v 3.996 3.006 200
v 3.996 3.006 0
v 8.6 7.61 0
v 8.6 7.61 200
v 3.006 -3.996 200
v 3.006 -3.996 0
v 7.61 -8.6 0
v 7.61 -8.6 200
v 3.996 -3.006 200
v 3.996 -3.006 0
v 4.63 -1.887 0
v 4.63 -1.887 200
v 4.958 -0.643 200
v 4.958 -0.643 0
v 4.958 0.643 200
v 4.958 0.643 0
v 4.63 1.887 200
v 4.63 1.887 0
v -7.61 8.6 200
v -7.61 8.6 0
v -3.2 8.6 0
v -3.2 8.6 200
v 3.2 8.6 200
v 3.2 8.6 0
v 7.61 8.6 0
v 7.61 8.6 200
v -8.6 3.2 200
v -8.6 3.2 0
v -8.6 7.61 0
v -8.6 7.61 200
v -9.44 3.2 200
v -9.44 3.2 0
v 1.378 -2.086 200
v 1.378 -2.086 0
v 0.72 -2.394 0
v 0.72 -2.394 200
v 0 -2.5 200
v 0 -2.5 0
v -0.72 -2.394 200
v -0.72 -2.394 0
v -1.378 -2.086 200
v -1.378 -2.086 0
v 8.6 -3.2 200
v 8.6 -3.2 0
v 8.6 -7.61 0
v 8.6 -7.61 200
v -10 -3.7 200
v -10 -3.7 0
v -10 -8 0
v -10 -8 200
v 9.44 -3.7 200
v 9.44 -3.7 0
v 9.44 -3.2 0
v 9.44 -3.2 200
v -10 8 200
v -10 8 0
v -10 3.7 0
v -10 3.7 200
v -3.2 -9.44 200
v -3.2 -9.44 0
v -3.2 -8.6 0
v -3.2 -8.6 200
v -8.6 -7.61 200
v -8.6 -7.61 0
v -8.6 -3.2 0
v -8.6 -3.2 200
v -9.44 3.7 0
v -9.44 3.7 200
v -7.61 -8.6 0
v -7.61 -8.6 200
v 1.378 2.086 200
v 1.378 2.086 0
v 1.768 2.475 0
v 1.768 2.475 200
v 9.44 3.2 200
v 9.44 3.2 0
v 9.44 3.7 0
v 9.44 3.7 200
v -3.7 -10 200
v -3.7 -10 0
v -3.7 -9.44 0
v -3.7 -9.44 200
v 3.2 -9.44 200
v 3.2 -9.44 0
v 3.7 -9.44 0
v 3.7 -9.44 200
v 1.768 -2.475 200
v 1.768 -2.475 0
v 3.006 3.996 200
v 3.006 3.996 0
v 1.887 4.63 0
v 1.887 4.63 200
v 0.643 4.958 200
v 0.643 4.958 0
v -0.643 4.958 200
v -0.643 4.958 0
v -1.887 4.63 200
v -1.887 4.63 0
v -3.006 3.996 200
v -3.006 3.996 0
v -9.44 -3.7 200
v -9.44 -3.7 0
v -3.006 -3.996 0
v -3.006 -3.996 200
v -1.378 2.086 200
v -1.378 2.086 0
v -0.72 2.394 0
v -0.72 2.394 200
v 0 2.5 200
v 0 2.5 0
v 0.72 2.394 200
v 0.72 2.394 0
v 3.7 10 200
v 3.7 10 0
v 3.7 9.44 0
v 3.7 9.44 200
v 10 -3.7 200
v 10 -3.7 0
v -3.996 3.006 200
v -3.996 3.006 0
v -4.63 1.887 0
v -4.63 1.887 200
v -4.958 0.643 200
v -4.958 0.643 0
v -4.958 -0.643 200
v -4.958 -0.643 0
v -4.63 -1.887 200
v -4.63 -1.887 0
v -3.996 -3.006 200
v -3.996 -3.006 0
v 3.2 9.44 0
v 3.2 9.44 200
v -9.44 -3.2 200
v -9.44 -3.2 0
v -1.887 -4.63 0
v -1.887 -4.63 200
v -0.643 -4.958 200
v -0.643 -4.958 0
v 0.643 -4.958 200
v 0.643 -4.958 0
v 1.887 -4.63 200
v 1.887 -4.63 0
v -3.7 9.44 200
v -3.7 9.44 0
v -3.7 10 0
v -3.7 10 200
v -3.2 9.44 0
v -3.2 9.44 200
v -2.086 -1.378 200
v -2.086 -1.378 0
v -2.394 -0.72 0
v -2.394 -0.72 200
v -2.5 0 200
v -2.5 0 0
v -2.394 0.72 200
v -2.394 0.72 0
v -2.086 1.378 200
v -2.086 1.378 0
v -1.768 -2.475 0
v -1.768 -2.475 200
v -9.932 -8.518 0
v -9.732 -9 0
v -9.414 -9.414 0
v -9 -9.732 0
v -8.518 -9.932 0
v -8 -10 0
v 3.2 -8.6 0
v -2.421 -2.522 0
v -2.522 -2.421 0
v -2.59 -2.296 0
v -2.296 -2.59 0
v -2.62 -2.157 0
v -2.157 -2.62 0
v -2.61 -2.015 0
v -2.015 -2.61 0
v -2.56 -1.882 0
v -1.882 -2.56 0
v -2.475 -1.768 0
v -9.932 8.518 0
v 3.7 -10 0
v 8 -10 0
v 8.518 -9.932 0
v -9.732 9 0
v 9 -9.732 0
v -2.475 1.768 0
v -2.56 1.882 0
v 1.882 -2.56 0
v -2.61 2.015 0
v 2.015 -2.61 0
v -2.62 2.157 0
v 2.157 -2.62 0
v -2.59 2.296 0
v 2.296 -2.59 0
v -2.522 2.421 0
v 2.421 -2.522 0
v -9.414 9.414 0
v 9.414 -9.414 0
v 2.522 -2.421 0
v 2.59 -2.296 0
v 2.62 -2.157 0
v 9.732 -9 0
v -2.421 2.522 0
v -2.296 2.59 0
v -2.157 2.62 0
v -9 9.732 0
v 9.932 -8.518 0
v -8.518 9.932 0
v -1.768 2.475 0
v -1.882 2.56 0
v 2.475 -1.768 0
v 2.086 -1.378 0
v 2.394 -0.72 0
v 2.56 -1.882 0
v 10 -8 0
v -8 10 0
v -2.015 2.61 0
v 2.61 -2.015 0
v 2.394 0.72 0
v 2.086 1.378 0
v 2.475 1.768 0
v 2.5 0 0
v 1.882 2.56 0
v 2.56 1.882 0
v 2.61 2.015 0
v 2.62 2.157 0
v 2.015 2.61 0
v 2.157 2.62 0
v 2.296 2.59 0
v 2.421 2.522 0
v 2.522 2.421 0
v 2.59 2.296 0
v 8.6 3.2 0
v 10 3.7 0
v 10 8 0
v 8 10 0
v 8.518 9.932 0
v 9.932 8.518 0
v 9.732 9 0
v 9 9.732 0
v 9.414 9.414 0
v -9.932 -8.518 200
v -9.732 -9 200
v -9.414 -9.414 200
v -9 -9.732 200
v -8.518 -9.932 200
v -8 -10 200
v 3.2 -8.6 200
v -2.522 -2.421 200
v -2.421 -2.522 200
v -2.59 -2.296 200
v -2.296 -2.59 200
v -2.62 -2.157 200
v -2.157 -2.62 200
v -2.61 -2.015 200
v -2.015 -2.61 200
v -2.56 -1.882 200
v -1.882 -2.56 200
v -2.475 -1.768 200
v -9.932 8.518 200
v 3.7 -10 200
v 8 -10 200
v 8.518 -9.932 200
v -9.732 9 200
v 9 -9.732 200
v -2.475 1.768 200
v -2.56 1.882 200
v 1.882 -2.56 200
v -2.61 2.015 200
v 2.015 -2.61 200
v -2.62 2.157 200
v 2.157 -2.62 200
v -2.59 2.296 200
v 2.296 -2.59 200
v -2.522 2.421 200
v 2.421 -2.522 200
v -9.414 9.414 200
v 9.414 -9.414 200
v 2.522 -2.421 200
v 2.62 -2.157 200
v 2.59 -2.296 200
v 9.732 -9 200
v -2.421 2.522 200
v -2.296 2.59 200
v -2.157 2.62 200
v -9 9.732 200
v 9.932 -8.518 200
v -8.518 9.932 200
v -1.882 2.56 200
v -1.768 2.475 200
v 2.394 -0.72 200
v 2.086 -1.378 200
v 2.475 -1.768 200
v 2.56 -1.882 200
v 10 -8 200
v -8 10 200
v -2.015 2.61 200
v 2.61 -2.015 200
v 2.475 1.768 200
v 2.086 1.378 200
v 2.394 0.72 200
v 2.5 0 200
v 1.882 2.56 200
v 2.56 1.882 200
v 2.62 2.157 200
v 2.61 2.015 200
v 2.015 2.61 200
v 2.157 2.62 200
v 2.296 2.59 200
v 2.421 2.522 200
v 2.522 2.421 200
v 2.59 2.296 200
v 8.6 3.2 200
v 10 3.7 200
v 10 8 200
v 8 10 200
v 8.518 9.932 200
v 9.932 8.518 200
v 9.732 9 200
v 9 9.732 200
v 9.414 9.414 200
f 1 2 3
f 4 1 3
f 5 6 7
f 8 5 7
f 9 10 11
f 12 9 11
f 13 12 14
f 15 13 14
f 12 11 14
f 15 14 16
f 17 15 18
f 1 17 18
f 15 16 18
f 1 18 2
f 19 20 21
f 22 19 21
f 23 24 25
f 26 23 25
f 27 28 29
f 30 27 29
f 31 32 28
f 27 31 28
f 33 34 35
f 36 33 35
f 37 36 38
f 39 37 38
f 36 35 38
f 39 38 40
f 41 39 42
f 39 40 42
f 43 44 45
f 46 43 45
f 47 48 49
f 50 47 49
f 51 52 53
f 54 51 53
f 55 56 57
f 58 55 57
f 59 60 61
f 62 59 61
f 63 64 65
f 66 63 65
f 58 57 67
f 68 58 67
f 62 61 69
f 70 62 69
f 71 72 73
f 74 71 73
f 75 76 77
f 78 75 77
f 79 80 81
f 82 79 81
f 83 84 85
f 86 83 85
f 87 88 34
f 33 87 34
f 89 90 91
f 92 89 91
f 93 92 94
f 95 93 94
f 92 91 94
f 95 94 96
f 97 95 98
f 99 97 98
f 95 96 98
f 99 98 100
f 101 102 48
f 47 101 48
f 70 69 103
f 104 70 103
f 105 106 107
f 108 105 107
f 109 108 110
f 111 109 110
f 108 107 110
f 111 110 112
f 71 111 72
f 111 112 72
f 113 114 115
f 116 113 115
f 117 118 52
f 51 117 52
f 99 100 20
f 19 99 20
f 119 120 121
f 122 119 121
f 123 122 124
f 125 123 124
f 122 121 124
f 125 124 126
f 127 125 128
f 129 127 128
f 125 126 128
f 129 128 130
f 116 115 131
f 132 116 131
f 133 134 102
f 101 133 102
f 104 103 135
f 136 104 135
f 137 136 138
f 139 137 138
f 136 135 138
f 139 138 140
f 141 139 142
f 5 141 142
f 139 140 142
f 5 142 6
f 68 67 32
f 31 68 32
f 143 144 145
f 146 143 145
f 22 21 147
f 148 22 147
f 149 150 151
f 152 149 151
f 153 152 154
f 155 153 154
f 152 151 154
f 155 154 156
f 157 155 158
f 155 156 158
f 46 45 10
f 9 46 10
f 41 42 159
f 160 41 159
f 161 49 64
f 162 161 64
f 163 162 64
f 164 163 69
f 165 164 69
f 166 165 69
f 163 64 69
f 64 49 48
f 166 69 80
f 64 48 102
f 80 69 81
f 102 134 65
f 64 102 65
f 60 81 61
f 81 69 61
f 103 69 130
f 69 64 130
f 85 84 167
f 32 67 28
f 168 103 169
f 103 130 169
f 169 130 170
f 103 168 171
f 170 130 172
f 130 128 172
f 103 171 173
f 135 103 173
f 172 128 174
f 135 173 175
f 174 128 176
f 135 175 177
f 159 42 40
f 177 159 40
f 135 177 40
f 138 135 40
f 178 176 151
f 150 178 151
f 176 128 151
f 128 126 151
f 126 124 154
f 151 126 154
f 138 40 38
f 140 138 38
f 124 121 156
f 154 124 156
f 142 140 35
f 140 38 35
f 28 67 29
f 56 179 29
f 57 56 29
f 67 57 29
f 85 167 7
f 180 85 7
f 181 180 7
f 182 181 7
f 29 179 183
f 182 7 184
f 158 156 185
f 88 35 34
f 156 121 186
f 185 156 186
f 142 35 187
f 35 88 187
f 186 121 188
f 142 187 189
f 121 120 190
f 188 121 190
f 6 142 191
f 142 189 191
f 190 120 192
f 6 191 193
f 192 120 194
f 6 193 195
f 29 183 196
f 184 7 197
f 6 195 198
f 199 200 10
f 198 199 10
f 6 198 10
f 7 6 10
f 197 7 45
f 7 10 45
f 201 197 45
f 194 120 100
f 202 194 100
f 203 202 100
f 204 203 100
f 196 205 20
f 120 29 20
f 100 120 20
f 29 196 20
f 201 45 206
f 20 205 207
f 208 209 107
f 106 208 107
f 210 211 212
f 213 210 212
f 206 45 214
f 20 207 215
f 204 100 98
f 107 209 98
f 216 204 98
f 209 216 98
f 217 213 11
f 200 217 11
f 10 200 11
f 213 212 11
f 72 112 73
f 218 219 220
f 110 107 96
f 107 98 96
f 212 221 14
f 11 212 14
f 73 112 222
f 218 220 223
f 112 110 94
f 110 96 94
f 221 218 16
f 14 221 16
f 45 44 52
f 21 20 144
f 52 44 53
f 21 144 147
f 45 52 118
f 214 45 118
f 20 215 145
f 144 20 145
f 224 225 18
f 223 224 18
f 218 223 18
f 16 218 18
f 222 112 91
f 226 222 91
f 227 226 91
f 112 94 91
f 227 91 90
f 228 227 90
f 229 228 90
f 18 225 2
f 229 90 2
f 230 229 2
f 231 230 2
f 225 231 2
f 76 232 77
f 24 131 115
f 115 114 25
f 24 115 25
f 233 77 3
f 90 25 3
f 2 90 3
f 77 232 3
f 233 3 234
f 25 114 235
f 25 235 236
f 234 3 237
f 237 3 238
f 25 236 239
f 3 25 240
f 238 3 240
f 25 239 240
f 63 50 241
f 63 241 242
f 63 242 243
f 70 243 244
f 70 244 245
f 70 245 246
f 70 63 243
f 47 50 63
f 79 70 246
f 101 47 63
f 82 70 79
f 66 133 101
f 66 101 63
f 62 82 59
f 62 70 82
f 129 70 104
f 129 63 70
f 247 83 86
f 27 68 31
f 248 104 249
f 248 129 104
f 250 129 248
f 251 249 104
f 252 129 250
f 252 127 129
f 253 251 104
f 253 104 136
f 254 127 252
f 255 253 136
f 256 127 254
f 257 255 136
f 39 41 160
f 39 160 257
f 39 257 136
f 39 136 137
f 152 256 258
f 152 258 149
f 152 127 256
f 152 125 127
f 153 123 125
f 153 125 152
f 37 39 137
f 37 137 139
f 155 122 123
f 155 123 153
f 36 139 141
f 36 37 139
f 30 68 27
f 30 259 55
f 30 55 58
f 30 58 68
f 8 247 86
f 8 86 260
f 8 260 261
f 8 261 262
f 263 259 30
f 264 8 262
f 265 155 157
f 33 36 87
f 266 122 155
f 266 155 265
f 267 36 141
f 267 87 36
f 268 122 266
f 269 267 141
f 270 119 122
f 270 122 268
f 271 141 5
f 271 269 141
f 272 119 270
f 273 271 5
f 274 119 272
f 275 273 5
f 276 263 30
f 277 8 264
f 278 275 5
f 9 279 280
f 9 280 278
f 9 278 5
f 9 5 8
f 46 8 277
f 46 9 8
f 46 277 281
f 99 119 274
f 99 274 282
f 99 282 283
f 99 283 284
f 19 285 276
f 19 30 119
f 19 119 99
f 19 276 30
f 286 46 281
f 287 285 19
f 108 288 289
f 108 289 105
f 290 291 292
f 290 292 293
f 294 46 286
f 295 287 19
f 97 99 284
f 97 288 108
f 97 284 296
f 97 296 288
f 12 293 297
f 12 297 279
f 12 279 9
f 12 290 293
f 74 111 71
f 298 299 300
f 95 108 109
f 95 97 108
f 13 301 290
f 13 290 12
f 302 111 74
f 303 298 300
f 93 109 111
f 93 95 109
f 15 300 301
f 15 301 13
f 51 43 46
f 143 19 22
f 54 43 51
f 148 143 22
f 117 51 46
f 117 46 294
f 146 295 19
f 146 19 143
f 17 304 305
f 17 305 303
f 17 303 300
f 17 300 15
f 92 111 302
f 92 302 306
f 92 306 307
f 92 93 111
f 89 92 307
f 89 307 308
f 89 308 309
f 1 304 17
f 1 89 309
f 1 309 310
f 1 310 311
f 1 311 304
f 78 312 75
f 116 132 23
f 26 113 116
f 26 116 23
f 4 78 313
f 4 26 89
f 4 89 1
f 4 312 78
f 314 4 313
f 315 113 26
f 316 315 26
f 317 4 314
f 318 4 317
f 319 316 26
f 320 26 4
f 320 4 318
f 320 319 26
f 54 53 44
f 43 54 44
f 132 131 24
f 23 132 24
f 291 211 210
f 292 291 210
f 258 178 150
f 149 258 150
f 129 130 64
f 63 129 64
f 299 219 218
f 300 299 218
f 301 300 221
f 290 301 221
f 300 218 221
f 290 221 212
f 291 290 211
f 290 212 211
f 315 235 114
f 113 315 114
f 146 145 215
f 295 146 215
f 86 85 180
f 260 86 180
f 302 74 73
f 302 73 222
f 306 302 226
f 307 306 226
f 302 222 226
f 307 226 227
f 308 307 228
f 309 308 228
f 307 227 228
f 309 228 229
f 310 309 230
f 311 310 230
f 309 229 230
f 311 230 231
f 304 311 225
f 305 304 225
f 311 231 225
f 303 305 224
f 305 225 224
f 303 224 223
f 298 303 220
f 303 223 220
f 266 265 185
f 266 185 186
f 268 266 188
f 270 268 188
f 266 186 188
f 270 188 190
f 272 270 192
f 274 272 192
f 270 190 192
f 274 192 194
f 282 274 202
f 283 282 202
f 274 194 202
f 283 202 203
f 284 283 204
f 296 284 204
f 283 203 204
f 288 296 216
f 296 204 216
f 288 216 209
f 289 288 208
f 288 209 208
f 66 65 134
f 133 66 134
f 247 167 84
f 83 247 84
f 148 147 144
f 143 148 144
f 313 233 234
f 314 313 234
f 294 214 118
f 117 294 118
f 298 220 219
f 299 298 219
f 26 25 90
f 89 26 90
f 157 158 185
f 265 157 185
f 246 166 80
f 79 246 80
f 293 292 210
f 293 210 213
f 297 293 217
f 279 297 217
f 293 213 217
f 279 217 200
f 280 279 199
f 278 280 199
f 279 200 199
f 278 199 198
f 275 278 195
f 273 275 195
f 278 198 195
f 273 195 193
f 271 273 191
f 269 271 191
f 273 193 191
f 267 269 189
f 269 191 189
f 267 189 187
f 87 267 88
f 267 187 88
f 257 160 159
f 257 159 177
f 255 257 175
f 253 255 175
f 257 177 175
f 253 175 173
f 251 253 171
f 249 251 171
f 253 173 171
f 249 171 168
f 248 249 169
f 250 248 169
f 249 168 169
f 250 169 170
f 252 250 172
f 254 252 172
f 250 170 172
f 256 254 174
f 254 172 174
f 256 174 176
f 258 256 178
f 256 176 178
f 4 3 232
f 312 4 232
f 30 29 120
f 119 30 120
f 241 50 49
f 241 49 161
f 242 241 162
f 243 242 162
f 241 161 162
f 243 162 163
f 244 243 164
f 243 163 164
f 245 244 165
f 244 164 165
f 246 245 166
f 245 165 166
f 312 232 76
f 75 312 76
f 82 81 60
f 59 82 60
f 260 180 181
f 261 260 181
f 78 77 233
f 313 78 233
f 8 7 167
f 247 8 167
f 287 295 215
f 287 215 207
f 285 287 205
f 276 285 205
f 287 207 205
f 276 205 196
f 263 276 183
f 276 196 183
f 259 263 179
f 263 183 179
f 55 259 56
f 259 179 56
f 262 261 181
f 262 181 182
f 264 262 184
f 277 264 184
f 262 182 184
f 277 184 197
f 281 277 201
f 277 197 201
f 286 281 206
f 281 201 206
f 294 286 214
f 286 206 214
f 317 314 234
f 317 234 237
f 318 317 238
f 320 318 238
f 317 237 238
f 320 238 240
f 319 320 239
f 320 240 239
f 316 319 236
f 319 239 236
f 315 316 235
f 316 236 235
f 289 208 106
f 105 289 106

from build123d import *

# Parameters (mm, degrees)
Y_KSEKLIK_EKSTR_ZYON1_DEPTH = 200


with BuildPart() as part:
    # Çizim1 → Yükseklik-Ekstrüzyon1 (new body)
    with BuildSketch(Plane.XY):
        with BuildLine():
            Line((8.6, 7.610050506), (8.6, 3.2))
            Line((8.6, 3.2), (9.44, 3.2))
            Line((9.44, 3.2), (9.44, 3.7))
            Line((9.44, 3.7), (10, 3.7))
            Line((10, 3.7), (10, 8))
            ThreePointArc((10, 8), (9.414213562, 9.414213562), (8, 10))
            Line((8, 10), (3.7, 10))
            Line((3.7, 10), (3.7, 9.44))
            Line((3.7, 9.44), (3.2, 9.44))
            Line((3.2, 9.44), (3.2, 8.6))
            Line((3.2, 8.6), (7.610050506, 8.6))
            Line((7.610050506, 8.6), (3.005739466, 3.99568896))
            ThreePointArc((3.005739466, 3.99568896), (0, 5), (-3.005739466, 3.99568896))
            Line((-3.005739466, 3.99568896), (-7.610050506, 8.6))
            Line((-7.610050506, 8.6), (-3.2, 8.6))
            Line((-3.2, 8.6), (-3.2, 9.44))
            Line((-3.2, 9.44), (-3.7, 9.44))
            Line((-3.7, 9.44), (-3.7, 10))
            Line((-3.7, 10), (-8, 10))
            ThreePointArc((-8, 10), (-9.414213562, 9.414213562), (-10, 8))
            Line((-10, 8), (-10, 3.7))
            Line((-10, 3.7), (-9.44, 3.7))
            Line((-9.44, 3.7), (-9.44, 3.2))
            Line((-9.44, 3.2), (-8.6, 3.2))
            Line((-8.6, 3.2), (-8.6, 7.610050506))
            Line((-8.6, 7.610050506), (-3.99568896, 3.005739466))
            ThreePointArc((-3.99568896, 3.005739466), (-5, 0), (-3.99568896, -3.005739466))
            Line((-3.99568896, -3.005739466), (-8.6, -7.610050506))
            Line((-8.6, -7.610050506), (-8.6, -3.2))
            Line((-8.6, -3.2), (-9.44, -3.2))
            Line((-9.44, -3.2), (-9.44, -3.7))
            Line((-9.44, -3.7), (-10, -3.7))
            Line((-10, -3.7), (-10, -8))
            ThreePointArc((-10, -8), (-9.414213562, -9.414213562), (-8, -10))
            Line((-8, -10), (-3.7, -10))
            Line((-3.7, -10), (-3.7, -9.44))
            Line((-3.7, -9.44), (-3.2, -9.44))
            Line((-3.2, -9.44), (-3.2, -8.6))
            Line((-3.2, -8.6), (-7.610050506, -8.6))
            Line((-7.610050506, -8.6), (-3.005739466, -3.99568896))
            ThreePointArc((-3.005739466, -3.99568896), (0, -5), (3.005739466, -3.99568896))
            Line((3.005739466, -3.99568896), (7.610050506, -8.6))
            Line((7.610050506, -8.6), (3.2, -8.6))
            Line((3.2, -8.6), (3.2, -9.44))
            Line((3.2, -9.44), (3.7, -9.44))
            Line((3.7, -9.44), (3.7, -10))
            Line((3.7, -10), (8, -10))
            ThreePointArc((8, -10), (9.414213562, -9.414213562), (10, -8))
            Line((10, -8), (10, -3.7))
            Line((10, -3.7), (9.44, -3.7))
            Line((9.44, -3.7), (9.44, -3.2))
            Line((9.44, -3.2), (8.6, -3.2))
            Line((8.6, -3.2), (8.6, -7.610050506))
            Line((8.6, -7.610050506), (3.99568896, -3.005739466))
            ThreePointArc((3.99568896, -3.005739466), (5, 0), (3.99568896, 3.005739466))
            Line((3.99568896, 3.005739466), (8.6, 7.610050506))
        make_face()
        with BuildLine():
            Line((2.474873734, 1.767766953), (2.085604198, 1.378497417))
            ThreePointArc((2.085604198, 1.378497417), (2.5, 0), (2.085604198, -1.378497417))
            Line((2.085604198, -1.378497417), (2.474873734, -1.767766953))
            ThreePointArc((2.474873734, -1.767766953), (2.474873734, -2.474873734), (1.767766953, -2.474873734))
            Line((1.767766953, -2.474873734), (1.378497417, -2.085604198))
            ThreePointArc((1.378497417, -2.085604198), (0, -2.5), (-1.378497417, -2.085604198))
            Line((-1.378497417, -2.085604198), (-1.767766953, -2.474873734))
            ThreePointArc((-1.767766953, -2.474873734), (-2.474873734, -2.474873734), (-2.474873734, -1.767766953))
            Line((-2.474873734, -1.767766953), (-2.085604198, -1.378497417))
            ThreePointArc((-2.085604198, -1.378497417), (-2.5, 0), (-2.085604198, 1.378497417))
            Line((-2.085604198, 1.378497417), (-2.474873734, 1.767766953))
            ThreePointArc((-2.474873734, 1.767766953), (-2.474873734, 2.474873734), (-1.767766953, 2.474873734))
            Line((-1.767766953, 2.474873734), (-1.378497417, 2.085604198))
            ThreePointArc((-1.378497417, 2.085604198), (0, 2.5), (1.378497417, 2.085604198))
            Line((1.378497417, 2.085604198), (1.767766953, 2.474873734))
            ThreePointArc((1.767766953, 2.474873734), (2.474873734, 2.474873734), (2.474873734, 1.767766953))
        make_face(mode=Mode.SUBTRACT)
    extrude(amount=Y_KSEKLIK_EKSTR_ZYON1_DEPTH)


solid = part.part
